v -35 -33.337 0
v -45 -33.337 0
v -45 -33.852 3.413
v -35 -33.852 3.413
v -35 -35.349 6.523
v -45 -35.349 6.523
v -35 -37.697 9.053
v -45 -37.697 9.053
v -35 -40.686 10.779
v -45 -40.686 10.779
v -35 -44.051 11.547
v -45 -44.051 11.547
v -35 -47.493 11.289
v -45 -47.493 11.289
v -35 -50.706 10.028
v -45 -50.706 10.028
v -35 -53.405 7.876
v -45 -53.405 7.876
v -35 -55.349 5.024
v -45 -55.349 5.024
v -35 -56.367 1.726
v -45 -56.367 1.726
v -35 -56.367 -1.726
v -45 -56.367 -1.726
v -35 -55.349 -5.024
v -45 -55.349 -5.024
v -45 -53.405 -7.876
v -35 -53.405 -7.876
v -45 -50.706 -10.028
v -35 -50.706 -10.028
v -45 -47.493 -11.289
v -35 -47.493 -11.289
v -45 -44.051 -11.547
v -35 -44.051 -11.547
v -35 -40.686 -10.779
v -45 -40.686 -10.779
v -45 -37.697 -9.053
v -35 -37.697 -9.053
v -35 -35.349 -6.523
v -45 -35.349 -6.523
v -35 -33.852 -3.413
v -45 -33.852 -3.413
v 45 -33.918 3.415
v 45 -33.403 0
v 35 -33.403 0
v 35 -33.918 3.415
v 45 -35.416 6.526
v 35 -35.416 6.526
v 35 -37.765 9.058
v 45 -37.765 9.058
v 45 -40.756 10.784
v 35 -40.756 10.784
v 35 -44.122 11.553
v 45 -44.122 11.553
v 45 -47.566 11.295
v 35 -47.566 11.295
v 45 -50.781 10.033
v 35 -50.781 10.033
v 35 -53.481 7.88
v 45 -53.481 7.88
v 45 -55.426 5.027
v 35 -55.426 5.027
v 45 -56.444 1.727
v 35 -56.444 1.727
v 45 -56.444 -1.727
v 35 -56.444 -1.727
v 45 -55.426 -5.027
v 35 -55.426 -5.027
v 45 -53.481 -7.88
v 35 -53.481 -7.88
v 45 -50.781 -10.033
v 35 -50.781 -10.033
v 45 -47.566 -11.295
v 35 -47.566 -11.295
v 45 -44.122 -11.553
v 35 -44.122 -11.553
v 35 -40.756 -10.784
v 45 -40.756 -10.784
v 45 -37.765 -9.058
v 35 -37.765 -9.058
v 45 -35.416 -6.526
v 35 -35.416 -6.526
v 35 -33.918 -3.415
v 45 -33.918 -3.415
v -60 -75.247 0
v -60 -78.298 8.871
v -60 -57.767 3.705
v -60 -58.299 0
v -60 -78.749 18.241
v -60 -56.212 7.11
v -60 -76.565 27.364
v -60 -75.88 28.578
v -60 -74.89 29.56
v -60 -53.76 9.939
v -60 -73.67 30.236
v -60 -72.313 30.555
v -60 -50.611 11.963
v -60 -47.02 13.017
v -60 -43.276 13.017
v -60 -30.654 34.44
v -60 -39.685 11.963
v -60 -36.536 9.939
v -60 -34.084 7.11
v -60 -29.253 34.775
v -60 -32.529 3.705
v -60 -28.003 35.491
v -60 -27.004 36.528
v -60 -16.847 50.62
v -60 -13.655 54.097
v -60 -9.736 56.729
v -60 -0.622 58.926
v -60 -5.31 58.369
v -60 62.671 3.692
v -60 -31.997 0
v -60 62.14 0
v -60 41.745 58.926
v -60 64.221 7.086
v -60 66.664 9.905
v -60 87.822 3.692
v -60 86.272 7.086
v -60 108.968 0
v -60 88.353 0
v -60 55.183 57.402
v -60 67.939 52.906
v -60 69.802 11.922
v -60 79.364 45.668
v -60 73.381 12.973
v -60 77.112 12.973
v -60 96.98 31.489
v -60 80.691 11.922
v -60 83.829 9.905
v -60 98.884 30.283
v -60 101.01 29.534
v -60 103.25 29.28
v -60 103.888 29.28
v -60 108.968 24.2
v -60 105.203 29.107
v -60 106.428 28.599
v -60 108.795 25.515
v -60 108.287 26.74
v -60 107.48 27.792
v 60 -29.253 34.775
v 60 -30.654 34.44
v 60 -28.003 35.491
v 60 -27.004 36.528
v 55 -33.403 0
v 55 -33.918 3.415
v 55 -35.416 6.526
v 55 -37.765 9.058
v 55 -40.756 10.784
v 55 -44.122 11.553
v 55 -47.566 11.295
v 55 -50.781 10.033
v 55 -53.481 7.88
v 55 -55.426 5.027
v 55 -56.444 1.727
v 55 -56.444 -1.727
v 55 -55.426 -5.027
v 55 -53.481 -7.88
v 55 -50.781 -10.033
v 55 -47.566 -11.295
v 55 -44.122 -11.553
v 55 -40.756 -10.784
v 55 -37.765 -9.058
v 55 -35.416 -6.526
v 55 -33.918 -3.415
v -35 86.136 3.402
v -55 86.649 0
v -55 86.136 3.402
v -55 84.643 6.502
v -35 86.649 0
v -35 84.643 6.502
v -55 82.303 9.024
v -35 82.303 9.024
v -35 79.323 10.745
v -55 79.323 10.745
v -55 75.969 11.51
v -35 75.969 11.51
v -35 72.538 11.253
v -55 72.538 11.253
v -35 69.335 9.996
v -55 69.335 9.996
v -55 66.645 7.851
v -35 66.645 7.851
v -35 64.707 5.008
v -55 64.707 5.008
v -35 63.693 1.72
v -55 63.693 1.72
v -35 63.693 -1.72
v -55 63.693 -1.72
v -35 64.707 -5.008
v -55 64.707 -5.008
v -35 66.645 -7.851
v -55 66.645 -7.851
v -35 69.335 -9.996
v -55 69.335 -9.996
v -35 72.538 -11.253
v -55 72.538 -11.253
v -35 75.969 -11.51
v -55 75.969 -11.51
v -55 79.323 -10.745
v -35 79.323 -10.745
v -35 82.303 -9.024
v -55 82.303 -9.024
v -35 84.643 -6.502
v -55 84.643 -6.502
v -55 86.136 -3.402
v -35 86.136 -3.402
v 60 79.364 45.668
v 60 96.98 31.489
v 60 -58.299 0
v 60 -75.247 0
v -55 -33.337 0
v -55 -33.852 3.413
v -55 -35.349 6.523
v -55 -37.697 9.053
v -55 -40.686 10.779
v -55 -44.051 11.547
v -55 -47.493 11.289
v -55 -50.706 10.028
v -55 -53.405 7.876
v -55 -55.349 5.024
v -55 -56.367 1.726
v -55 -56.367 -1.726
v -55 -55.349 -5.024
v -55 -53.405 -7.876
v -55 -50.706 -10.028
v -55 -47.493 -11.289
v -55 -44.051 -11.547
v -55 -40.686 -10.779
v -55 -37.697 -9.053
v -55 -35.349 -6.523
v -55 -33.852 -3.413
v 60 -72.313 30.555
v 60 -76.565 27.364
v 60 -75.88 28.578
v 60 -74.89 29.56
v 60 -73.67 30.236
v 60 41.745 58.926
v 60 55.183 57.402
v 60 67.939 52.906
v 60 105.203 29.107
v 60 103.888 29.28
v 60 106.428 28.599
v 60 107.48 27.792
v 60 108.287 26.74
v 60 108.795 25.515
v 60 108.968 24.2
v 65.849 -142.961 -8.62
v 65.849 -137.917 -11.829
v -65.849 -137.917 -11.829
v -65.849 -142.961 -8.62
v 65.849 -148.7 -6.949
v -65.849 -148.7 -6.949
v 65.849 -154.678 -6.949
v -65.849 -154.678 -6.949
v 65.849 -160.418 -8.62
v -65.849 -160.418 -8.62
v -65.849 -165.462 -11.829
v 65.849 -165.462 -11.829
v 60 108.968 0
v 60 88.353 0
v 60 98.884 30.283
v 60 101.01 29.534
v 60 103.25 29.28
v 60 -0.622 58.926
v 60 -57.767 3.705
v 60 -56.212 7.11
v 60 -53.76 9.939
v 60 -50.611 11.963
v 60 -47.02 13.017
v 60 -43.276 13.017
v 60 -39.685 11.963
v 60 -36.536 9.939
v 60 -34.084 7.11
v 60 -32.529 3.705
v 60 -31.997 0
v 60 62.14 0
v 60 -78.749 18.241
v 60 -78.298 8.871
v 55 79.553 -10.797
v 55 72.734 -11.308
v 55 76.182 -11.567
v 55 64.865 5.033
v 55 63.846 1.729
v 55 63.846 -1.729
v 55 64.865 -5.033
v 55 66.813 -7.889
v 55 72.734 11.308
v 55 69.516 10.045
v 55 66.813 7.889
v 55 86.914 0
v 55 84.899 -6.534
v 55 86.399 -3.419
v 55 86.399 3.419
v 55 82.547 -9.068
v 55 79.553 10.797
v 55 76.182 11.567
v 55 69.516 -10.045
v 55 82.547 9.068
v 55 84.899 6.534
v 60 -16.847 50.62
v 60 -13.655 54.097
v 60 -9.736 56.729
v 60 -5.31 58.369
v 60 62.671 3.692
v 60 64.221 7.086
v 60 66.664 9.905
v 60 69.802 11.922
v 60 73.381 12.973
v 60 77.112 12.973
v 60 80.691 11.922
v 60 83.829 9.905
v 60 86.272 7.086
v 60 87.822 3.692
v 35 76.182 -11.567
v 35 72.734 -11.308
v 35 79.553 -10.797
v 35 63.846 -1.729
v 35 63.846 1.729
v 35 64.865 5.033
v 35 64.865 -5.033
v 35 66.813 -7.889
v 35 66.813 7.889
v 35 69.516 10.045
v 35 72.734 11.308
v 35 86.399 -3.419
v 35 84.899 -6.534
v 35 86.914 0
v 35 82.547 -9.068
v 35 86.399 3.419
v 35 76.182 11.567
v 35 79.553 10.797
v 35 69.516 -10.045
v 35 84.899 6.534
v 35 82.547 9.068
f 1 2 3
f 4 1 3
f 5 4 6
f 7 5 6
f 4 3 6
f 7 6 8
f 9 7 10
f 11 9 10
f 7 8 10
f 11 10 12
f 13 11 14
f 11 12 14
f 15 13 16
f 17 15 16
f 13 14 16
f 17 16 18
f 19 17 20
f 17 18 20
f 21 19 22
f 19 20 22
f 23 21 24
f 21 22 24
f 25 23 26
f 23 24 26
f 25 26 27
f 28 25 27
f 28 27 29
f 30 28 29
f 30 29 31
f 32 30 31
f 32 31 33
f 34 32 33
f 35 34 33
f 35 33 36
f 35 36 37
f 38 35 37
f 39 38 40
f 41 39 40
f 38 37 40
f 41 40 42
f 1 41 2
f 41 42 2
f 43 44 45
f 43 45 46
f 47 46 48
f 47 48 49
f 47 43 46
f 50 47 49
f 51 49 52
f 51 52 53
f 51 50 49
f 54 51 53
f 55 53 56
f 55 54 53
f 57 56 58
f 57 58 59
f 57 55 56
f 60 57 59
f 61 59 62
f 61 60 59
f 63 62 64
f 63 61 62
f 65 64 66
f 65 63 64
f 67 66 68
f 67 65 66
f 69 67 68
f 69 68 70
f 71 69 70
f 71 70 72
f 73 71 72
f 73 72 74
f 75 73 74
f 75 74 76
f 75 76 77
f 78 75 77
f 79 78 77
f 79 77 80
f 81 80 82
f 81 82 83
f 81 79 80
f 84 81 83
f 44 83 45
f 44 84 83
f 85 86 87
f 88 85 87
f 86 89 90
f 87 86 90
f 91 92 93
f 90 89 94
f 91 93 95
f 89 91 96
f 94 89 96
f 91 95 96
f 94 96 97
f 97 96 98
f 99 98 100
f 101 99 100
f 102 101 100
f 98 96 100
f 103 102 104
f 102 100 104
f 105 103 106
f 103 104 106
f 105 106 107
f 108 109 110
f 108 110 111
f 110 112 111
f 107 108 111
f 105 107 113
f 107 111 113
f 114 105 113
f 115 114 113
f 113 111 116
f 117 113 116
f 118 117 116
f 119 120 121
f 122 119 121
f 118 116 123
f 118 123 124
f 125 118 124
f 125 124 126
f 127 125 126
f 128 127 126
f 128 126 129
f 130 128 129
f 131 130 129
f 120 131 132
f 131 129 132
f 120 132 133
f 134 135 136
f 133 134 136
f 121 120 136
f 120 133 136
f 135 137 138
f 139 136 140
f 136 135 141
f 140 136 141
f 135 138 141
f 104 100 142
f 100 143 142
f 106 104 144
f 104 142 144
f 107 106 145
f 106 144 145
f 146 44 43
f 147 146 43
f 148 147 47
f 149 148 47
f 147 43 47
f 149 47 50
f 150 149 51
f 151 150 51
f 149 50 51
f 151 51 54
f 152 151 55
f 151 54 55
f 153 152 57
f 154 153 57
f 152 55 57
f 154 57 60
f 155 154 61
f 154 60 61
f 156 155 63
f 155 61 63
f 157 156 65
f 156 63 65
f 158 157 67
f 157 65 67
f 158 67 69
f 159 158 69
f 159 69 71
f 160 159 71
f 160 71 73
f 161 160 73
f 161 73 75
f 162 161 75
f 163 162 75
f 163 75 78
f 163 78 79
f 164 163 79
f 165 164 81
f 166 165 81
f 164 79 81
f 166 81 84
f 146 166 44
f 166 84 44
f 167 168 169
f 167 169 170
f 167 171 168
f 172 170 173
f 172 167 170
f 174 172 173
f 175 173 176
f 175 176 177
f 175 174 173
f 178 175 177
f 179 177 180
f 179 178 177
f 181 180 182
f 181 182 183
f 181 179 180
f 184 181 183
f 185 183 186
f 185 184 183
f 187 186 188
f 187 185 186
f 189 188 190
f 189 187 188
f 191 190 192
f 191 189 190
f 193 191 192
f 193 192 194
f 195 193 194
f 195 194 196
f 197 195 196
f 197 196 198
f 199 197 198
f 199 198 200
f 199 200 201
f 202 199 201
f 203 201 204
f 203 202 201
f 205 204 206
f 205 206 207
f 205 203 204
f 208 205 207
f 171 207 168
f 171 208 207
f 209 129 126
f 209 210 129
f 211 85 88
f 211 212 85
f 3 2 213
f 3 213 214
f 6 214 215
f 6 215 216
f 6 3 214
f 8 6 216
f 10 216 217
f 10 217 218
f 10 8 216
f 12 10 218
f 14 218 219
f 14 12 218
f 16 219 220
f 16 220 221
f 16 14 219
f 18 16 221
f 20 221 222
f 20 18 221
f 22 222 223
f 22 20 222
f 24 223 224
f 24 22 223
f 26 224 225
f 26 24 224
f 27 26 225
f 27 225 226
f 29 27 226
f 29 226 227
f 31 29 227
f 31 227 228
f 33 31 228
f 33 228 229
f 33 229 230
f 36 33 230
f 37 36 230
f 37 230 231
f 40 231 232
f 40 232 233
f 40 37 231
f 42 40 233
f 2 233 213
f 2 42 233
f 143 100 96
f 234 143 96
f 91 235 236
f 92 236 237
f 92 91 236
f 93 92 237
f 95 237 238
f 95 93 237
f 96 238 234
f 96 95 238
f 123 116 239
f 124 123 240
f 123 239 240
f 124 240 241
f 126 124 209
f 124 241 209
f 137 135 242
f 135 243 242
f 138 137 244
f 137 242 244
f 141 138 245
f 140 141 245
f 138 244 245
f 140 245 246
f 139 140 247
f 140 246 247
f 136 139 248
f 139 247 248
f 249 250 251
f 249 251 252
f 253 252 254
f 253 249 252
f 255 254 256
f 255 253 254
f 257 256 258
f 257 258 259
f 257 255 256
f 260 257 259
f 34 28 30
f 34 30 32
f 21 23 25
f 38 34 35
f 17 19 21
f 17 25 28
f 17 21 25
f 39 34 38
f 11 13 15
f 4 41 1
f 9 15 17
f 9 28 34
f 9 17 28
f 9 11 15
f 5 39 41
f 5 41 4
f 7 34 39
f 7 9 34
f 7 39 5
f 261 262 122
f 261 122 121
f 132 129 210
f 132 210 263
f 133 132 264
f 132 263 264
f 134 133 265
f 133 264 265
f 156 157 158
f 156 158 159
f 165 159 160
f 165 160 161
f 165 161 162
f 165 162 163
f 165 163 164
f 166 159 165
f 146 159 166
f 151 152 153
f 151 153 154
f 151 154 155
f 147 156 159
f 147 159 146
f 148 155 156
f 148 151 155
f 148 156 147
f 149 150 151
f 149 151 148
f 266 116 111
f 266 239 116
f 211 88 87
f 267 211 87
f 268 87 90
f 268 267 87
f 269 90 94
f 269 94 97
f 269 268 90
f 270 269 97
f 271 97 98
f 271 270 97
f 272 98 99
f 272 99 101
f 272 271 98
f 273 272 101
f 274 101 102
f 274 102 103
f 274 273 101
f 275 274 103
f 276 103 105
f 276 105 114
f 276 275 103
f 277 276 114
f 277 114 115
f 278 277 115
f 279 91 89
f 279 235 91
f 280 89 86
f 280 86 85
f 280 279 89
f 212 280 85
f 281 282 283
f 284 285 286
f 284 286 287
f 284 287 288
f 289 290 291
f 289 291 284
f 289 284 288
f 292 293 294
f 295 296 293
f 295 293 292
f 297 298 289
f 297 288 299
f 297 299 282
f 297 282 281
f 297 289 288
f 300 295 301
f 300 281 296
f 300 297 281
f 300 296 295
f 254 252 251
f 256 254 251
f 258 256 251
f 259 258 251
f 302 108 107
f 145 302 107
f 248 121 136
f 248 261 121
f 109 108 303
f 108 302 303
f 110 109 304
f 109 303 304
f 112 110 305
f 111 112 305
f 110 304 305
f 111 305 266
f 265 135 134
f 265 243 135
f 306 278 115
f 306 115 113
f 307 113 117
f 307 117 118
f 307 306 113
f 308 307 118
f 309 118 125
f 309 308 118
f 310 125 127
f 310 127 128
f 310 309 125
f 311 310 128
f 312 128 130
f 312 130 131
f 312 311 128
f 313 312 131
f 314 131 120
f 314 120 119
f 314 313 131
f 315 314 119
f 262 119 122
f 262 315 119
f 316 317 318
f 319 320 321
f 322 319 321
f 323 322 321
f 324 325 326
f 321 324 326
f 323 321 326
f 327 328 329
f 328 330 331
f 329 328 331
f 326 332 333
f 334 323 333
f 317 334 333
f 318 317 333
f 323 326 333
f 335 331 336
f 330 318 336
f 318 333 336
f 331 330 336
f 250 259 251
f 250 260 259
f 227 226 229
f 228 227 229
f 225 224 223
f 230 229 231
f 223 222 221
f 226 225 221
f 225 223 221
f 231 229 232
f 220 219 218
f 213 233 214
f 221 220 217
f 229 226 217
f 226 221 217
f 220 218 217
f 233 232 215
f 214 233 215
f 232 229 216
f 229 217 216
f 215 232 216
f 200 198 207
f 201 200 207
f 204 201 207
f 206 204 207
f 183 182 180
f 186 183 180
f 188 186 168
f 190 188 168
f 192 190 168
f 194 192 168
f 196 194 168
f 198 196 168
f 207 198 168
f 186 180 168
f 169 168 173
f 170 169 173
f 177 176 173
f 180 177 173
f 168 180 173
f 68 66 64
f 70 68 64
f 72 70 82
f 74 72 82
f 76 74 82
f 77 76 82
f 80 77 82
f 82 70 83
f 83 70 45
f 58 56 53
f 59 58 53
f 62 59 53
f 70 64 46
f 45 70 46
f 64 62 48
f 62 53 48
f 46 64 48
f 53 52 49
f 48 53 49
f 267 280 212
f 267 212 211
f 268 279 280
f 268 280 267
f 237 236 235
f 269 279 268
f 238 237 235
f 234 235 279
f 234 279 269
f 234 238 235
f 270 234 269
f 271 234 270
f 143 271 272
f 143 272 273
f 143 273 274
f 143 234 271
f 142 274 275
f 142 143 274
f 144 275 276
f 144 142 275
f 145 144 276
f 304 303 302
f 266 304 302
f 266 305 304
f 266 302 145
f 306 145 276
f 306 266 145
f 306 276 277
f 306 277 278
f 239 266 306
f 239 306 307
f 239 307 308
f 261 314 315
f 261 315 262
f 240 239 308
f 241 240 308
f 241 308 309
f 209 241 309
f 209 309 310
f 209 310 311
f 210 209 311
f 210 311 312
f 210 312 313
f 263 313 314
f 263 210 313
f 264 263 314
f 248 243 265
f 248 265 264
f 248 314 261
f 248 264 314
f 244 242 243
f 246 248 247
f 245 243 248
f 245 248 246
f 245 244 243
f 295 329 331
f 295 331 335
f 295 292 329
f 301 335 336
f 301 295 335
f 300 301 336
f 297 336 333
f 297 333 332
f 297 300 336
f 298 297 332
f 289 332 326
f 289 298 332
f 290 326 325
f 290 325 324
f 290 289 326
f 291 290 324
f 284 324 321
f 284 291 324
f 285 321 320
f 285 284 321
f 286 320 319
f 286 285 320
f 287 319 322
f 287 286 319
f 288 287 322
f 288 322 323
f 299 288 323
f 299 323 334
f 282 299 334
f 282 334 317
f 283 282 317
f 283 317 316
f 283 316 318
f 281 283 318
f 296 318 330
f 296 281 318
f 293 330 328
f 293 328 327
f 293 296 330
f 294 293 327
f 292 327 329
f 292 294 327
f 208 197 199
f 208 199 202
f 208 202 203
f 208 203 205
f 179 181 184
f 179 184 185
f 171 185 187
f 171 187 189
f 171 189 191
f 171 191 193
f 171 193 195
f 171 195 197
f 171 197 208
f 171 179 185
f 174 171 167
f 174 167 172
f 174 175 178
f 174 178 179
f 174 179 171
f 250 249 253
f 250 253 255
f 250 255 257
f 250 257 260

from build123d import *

# Parameters (mm, degrees)
F1_DEPTH  = 60
F2_R      = 5.08
F3_R      = 20
F4_R      = 60
F5_R      = 10
F6_R      = 5.08
F8_R      = 11.585217
F8_R_2    = 11.599017
F9_DEPTH  = 10
F12_DEPTH = 65.84908
F14_R     = 11.579273
F14_R_2   = 11.542485
F15_DEPTH = 10


with BuildPart() as f1:
    # F0 (on Right) → F1 (new body, symmetric)
    with BuildSketch(Plane.YZ):
        with BuildLine():
            ThreePointArc((-58.299312, 0), (-45.147976, 13.151336), (-31.996639, 0))
            Line((-31.996639, 0), (62.140226, 0))
            ThreePointArc((62.140226, 0), (75.246626, 13.1064), (88.353026, 0))
            Line((88.353026, 0), (108.967906, 0))
            Line((108.967906, 0), (108.967906, 29.27976))
            Line((108.967906, 29.27976), (99.725904, 29.27976))
            Line((99.725904, 29.27976), (62.890634, 58.926177))
            Line((62.890634, 58.926177), (-10.860988, 58.926177))
            Line((-10.860988, 58.926177), (-28.354256, 34.654268))
            Line((-28.354256, 34.654268), (-75.246626, 30.28095))
            ThreePointArc((-75.246626, 30.28095), (-78.894076, 15.140475), (-75.246626, 0))
            Line((-75.246626, 0), (-58.299312, 0))
        make_face()
    extrude(amount=F1_DEPTH, both=True)

    # F2
    f2_edges = [f1.edges().sort_by_distance(p)[0] for p in [
        (0, -75.246626, 30.28095),
        (0, -28.354256, 34.654268),
    ]]
    fillet(f2_edges, radius=F2_R)

    # F3
    f3_edges = [f1.edges().sort_by_distance(p)[0] for p in [
        (0, -10.860988, 58.926177),
    ]]
    fillet(f3_edges, radius=F3_R)

    # F4
    f4_edges = [f1.edges().sort_by_distance(p)[0] for p in [
        (0, 62.890634, 58.926177),
    ]]
    fillet(f4_edges, radius=F4_R)

    # F5
    f5_edges = [f1.edges().sort_by_distance(p)[0] for p in [
        (0, 99.725904, 29.27976),
    ]]
    fillet(f5_edges, radius=F5_R)

    # F6
    f6_edges = [f1.edges().sort_by_distance(p)[0] for p in [
        (0, 108.967906, 29.27976),
    ]]
    fillet(f6_edges, radius=F6_R)


with BuildPart() as f9:
    # F8 (on offset) → F9 (new body, symmetric)
    with BuildSketch(Plane.YZ.offset(45)):
        with Locations((-44.988211, 0)):
            Circle(F8_R)
        with Locations((75.315431, 0)):
            Circle(F8_R_2)
    extrude(amount=F9_DEPTH, both=True)


with BuildPart() as f12:
    # F11 (on Right) → F12 (new body, symmetric)
    with BuildSketch(Plane.YZ):
        with BuildLine():
            Line((-165.461525, -11.829036), (-137.917042, -11.829036))
            ThreePointArc((-137.917042, -11.829036), (-151.689284, -6.736467), (-165.461525, -11.829036))
        make_face()
    extrude(amount=F12_DEPTH, both=True)


with BuildPart() as f15:
    # F14 (on offset) → F15 (new body, symmetric)
    with BuildSketch(Plane.YZ.offset(-45)):
        with Locations((-44.916697, 0)):
            Circle(F14_R)
        with Locations((75.106494, 0)):
            Circle(F14_R_2)
    extrude(amount=F15_DEPTH, both=True)


solid = Compound([f1.part, f9.part, f12.part, f15.part])
